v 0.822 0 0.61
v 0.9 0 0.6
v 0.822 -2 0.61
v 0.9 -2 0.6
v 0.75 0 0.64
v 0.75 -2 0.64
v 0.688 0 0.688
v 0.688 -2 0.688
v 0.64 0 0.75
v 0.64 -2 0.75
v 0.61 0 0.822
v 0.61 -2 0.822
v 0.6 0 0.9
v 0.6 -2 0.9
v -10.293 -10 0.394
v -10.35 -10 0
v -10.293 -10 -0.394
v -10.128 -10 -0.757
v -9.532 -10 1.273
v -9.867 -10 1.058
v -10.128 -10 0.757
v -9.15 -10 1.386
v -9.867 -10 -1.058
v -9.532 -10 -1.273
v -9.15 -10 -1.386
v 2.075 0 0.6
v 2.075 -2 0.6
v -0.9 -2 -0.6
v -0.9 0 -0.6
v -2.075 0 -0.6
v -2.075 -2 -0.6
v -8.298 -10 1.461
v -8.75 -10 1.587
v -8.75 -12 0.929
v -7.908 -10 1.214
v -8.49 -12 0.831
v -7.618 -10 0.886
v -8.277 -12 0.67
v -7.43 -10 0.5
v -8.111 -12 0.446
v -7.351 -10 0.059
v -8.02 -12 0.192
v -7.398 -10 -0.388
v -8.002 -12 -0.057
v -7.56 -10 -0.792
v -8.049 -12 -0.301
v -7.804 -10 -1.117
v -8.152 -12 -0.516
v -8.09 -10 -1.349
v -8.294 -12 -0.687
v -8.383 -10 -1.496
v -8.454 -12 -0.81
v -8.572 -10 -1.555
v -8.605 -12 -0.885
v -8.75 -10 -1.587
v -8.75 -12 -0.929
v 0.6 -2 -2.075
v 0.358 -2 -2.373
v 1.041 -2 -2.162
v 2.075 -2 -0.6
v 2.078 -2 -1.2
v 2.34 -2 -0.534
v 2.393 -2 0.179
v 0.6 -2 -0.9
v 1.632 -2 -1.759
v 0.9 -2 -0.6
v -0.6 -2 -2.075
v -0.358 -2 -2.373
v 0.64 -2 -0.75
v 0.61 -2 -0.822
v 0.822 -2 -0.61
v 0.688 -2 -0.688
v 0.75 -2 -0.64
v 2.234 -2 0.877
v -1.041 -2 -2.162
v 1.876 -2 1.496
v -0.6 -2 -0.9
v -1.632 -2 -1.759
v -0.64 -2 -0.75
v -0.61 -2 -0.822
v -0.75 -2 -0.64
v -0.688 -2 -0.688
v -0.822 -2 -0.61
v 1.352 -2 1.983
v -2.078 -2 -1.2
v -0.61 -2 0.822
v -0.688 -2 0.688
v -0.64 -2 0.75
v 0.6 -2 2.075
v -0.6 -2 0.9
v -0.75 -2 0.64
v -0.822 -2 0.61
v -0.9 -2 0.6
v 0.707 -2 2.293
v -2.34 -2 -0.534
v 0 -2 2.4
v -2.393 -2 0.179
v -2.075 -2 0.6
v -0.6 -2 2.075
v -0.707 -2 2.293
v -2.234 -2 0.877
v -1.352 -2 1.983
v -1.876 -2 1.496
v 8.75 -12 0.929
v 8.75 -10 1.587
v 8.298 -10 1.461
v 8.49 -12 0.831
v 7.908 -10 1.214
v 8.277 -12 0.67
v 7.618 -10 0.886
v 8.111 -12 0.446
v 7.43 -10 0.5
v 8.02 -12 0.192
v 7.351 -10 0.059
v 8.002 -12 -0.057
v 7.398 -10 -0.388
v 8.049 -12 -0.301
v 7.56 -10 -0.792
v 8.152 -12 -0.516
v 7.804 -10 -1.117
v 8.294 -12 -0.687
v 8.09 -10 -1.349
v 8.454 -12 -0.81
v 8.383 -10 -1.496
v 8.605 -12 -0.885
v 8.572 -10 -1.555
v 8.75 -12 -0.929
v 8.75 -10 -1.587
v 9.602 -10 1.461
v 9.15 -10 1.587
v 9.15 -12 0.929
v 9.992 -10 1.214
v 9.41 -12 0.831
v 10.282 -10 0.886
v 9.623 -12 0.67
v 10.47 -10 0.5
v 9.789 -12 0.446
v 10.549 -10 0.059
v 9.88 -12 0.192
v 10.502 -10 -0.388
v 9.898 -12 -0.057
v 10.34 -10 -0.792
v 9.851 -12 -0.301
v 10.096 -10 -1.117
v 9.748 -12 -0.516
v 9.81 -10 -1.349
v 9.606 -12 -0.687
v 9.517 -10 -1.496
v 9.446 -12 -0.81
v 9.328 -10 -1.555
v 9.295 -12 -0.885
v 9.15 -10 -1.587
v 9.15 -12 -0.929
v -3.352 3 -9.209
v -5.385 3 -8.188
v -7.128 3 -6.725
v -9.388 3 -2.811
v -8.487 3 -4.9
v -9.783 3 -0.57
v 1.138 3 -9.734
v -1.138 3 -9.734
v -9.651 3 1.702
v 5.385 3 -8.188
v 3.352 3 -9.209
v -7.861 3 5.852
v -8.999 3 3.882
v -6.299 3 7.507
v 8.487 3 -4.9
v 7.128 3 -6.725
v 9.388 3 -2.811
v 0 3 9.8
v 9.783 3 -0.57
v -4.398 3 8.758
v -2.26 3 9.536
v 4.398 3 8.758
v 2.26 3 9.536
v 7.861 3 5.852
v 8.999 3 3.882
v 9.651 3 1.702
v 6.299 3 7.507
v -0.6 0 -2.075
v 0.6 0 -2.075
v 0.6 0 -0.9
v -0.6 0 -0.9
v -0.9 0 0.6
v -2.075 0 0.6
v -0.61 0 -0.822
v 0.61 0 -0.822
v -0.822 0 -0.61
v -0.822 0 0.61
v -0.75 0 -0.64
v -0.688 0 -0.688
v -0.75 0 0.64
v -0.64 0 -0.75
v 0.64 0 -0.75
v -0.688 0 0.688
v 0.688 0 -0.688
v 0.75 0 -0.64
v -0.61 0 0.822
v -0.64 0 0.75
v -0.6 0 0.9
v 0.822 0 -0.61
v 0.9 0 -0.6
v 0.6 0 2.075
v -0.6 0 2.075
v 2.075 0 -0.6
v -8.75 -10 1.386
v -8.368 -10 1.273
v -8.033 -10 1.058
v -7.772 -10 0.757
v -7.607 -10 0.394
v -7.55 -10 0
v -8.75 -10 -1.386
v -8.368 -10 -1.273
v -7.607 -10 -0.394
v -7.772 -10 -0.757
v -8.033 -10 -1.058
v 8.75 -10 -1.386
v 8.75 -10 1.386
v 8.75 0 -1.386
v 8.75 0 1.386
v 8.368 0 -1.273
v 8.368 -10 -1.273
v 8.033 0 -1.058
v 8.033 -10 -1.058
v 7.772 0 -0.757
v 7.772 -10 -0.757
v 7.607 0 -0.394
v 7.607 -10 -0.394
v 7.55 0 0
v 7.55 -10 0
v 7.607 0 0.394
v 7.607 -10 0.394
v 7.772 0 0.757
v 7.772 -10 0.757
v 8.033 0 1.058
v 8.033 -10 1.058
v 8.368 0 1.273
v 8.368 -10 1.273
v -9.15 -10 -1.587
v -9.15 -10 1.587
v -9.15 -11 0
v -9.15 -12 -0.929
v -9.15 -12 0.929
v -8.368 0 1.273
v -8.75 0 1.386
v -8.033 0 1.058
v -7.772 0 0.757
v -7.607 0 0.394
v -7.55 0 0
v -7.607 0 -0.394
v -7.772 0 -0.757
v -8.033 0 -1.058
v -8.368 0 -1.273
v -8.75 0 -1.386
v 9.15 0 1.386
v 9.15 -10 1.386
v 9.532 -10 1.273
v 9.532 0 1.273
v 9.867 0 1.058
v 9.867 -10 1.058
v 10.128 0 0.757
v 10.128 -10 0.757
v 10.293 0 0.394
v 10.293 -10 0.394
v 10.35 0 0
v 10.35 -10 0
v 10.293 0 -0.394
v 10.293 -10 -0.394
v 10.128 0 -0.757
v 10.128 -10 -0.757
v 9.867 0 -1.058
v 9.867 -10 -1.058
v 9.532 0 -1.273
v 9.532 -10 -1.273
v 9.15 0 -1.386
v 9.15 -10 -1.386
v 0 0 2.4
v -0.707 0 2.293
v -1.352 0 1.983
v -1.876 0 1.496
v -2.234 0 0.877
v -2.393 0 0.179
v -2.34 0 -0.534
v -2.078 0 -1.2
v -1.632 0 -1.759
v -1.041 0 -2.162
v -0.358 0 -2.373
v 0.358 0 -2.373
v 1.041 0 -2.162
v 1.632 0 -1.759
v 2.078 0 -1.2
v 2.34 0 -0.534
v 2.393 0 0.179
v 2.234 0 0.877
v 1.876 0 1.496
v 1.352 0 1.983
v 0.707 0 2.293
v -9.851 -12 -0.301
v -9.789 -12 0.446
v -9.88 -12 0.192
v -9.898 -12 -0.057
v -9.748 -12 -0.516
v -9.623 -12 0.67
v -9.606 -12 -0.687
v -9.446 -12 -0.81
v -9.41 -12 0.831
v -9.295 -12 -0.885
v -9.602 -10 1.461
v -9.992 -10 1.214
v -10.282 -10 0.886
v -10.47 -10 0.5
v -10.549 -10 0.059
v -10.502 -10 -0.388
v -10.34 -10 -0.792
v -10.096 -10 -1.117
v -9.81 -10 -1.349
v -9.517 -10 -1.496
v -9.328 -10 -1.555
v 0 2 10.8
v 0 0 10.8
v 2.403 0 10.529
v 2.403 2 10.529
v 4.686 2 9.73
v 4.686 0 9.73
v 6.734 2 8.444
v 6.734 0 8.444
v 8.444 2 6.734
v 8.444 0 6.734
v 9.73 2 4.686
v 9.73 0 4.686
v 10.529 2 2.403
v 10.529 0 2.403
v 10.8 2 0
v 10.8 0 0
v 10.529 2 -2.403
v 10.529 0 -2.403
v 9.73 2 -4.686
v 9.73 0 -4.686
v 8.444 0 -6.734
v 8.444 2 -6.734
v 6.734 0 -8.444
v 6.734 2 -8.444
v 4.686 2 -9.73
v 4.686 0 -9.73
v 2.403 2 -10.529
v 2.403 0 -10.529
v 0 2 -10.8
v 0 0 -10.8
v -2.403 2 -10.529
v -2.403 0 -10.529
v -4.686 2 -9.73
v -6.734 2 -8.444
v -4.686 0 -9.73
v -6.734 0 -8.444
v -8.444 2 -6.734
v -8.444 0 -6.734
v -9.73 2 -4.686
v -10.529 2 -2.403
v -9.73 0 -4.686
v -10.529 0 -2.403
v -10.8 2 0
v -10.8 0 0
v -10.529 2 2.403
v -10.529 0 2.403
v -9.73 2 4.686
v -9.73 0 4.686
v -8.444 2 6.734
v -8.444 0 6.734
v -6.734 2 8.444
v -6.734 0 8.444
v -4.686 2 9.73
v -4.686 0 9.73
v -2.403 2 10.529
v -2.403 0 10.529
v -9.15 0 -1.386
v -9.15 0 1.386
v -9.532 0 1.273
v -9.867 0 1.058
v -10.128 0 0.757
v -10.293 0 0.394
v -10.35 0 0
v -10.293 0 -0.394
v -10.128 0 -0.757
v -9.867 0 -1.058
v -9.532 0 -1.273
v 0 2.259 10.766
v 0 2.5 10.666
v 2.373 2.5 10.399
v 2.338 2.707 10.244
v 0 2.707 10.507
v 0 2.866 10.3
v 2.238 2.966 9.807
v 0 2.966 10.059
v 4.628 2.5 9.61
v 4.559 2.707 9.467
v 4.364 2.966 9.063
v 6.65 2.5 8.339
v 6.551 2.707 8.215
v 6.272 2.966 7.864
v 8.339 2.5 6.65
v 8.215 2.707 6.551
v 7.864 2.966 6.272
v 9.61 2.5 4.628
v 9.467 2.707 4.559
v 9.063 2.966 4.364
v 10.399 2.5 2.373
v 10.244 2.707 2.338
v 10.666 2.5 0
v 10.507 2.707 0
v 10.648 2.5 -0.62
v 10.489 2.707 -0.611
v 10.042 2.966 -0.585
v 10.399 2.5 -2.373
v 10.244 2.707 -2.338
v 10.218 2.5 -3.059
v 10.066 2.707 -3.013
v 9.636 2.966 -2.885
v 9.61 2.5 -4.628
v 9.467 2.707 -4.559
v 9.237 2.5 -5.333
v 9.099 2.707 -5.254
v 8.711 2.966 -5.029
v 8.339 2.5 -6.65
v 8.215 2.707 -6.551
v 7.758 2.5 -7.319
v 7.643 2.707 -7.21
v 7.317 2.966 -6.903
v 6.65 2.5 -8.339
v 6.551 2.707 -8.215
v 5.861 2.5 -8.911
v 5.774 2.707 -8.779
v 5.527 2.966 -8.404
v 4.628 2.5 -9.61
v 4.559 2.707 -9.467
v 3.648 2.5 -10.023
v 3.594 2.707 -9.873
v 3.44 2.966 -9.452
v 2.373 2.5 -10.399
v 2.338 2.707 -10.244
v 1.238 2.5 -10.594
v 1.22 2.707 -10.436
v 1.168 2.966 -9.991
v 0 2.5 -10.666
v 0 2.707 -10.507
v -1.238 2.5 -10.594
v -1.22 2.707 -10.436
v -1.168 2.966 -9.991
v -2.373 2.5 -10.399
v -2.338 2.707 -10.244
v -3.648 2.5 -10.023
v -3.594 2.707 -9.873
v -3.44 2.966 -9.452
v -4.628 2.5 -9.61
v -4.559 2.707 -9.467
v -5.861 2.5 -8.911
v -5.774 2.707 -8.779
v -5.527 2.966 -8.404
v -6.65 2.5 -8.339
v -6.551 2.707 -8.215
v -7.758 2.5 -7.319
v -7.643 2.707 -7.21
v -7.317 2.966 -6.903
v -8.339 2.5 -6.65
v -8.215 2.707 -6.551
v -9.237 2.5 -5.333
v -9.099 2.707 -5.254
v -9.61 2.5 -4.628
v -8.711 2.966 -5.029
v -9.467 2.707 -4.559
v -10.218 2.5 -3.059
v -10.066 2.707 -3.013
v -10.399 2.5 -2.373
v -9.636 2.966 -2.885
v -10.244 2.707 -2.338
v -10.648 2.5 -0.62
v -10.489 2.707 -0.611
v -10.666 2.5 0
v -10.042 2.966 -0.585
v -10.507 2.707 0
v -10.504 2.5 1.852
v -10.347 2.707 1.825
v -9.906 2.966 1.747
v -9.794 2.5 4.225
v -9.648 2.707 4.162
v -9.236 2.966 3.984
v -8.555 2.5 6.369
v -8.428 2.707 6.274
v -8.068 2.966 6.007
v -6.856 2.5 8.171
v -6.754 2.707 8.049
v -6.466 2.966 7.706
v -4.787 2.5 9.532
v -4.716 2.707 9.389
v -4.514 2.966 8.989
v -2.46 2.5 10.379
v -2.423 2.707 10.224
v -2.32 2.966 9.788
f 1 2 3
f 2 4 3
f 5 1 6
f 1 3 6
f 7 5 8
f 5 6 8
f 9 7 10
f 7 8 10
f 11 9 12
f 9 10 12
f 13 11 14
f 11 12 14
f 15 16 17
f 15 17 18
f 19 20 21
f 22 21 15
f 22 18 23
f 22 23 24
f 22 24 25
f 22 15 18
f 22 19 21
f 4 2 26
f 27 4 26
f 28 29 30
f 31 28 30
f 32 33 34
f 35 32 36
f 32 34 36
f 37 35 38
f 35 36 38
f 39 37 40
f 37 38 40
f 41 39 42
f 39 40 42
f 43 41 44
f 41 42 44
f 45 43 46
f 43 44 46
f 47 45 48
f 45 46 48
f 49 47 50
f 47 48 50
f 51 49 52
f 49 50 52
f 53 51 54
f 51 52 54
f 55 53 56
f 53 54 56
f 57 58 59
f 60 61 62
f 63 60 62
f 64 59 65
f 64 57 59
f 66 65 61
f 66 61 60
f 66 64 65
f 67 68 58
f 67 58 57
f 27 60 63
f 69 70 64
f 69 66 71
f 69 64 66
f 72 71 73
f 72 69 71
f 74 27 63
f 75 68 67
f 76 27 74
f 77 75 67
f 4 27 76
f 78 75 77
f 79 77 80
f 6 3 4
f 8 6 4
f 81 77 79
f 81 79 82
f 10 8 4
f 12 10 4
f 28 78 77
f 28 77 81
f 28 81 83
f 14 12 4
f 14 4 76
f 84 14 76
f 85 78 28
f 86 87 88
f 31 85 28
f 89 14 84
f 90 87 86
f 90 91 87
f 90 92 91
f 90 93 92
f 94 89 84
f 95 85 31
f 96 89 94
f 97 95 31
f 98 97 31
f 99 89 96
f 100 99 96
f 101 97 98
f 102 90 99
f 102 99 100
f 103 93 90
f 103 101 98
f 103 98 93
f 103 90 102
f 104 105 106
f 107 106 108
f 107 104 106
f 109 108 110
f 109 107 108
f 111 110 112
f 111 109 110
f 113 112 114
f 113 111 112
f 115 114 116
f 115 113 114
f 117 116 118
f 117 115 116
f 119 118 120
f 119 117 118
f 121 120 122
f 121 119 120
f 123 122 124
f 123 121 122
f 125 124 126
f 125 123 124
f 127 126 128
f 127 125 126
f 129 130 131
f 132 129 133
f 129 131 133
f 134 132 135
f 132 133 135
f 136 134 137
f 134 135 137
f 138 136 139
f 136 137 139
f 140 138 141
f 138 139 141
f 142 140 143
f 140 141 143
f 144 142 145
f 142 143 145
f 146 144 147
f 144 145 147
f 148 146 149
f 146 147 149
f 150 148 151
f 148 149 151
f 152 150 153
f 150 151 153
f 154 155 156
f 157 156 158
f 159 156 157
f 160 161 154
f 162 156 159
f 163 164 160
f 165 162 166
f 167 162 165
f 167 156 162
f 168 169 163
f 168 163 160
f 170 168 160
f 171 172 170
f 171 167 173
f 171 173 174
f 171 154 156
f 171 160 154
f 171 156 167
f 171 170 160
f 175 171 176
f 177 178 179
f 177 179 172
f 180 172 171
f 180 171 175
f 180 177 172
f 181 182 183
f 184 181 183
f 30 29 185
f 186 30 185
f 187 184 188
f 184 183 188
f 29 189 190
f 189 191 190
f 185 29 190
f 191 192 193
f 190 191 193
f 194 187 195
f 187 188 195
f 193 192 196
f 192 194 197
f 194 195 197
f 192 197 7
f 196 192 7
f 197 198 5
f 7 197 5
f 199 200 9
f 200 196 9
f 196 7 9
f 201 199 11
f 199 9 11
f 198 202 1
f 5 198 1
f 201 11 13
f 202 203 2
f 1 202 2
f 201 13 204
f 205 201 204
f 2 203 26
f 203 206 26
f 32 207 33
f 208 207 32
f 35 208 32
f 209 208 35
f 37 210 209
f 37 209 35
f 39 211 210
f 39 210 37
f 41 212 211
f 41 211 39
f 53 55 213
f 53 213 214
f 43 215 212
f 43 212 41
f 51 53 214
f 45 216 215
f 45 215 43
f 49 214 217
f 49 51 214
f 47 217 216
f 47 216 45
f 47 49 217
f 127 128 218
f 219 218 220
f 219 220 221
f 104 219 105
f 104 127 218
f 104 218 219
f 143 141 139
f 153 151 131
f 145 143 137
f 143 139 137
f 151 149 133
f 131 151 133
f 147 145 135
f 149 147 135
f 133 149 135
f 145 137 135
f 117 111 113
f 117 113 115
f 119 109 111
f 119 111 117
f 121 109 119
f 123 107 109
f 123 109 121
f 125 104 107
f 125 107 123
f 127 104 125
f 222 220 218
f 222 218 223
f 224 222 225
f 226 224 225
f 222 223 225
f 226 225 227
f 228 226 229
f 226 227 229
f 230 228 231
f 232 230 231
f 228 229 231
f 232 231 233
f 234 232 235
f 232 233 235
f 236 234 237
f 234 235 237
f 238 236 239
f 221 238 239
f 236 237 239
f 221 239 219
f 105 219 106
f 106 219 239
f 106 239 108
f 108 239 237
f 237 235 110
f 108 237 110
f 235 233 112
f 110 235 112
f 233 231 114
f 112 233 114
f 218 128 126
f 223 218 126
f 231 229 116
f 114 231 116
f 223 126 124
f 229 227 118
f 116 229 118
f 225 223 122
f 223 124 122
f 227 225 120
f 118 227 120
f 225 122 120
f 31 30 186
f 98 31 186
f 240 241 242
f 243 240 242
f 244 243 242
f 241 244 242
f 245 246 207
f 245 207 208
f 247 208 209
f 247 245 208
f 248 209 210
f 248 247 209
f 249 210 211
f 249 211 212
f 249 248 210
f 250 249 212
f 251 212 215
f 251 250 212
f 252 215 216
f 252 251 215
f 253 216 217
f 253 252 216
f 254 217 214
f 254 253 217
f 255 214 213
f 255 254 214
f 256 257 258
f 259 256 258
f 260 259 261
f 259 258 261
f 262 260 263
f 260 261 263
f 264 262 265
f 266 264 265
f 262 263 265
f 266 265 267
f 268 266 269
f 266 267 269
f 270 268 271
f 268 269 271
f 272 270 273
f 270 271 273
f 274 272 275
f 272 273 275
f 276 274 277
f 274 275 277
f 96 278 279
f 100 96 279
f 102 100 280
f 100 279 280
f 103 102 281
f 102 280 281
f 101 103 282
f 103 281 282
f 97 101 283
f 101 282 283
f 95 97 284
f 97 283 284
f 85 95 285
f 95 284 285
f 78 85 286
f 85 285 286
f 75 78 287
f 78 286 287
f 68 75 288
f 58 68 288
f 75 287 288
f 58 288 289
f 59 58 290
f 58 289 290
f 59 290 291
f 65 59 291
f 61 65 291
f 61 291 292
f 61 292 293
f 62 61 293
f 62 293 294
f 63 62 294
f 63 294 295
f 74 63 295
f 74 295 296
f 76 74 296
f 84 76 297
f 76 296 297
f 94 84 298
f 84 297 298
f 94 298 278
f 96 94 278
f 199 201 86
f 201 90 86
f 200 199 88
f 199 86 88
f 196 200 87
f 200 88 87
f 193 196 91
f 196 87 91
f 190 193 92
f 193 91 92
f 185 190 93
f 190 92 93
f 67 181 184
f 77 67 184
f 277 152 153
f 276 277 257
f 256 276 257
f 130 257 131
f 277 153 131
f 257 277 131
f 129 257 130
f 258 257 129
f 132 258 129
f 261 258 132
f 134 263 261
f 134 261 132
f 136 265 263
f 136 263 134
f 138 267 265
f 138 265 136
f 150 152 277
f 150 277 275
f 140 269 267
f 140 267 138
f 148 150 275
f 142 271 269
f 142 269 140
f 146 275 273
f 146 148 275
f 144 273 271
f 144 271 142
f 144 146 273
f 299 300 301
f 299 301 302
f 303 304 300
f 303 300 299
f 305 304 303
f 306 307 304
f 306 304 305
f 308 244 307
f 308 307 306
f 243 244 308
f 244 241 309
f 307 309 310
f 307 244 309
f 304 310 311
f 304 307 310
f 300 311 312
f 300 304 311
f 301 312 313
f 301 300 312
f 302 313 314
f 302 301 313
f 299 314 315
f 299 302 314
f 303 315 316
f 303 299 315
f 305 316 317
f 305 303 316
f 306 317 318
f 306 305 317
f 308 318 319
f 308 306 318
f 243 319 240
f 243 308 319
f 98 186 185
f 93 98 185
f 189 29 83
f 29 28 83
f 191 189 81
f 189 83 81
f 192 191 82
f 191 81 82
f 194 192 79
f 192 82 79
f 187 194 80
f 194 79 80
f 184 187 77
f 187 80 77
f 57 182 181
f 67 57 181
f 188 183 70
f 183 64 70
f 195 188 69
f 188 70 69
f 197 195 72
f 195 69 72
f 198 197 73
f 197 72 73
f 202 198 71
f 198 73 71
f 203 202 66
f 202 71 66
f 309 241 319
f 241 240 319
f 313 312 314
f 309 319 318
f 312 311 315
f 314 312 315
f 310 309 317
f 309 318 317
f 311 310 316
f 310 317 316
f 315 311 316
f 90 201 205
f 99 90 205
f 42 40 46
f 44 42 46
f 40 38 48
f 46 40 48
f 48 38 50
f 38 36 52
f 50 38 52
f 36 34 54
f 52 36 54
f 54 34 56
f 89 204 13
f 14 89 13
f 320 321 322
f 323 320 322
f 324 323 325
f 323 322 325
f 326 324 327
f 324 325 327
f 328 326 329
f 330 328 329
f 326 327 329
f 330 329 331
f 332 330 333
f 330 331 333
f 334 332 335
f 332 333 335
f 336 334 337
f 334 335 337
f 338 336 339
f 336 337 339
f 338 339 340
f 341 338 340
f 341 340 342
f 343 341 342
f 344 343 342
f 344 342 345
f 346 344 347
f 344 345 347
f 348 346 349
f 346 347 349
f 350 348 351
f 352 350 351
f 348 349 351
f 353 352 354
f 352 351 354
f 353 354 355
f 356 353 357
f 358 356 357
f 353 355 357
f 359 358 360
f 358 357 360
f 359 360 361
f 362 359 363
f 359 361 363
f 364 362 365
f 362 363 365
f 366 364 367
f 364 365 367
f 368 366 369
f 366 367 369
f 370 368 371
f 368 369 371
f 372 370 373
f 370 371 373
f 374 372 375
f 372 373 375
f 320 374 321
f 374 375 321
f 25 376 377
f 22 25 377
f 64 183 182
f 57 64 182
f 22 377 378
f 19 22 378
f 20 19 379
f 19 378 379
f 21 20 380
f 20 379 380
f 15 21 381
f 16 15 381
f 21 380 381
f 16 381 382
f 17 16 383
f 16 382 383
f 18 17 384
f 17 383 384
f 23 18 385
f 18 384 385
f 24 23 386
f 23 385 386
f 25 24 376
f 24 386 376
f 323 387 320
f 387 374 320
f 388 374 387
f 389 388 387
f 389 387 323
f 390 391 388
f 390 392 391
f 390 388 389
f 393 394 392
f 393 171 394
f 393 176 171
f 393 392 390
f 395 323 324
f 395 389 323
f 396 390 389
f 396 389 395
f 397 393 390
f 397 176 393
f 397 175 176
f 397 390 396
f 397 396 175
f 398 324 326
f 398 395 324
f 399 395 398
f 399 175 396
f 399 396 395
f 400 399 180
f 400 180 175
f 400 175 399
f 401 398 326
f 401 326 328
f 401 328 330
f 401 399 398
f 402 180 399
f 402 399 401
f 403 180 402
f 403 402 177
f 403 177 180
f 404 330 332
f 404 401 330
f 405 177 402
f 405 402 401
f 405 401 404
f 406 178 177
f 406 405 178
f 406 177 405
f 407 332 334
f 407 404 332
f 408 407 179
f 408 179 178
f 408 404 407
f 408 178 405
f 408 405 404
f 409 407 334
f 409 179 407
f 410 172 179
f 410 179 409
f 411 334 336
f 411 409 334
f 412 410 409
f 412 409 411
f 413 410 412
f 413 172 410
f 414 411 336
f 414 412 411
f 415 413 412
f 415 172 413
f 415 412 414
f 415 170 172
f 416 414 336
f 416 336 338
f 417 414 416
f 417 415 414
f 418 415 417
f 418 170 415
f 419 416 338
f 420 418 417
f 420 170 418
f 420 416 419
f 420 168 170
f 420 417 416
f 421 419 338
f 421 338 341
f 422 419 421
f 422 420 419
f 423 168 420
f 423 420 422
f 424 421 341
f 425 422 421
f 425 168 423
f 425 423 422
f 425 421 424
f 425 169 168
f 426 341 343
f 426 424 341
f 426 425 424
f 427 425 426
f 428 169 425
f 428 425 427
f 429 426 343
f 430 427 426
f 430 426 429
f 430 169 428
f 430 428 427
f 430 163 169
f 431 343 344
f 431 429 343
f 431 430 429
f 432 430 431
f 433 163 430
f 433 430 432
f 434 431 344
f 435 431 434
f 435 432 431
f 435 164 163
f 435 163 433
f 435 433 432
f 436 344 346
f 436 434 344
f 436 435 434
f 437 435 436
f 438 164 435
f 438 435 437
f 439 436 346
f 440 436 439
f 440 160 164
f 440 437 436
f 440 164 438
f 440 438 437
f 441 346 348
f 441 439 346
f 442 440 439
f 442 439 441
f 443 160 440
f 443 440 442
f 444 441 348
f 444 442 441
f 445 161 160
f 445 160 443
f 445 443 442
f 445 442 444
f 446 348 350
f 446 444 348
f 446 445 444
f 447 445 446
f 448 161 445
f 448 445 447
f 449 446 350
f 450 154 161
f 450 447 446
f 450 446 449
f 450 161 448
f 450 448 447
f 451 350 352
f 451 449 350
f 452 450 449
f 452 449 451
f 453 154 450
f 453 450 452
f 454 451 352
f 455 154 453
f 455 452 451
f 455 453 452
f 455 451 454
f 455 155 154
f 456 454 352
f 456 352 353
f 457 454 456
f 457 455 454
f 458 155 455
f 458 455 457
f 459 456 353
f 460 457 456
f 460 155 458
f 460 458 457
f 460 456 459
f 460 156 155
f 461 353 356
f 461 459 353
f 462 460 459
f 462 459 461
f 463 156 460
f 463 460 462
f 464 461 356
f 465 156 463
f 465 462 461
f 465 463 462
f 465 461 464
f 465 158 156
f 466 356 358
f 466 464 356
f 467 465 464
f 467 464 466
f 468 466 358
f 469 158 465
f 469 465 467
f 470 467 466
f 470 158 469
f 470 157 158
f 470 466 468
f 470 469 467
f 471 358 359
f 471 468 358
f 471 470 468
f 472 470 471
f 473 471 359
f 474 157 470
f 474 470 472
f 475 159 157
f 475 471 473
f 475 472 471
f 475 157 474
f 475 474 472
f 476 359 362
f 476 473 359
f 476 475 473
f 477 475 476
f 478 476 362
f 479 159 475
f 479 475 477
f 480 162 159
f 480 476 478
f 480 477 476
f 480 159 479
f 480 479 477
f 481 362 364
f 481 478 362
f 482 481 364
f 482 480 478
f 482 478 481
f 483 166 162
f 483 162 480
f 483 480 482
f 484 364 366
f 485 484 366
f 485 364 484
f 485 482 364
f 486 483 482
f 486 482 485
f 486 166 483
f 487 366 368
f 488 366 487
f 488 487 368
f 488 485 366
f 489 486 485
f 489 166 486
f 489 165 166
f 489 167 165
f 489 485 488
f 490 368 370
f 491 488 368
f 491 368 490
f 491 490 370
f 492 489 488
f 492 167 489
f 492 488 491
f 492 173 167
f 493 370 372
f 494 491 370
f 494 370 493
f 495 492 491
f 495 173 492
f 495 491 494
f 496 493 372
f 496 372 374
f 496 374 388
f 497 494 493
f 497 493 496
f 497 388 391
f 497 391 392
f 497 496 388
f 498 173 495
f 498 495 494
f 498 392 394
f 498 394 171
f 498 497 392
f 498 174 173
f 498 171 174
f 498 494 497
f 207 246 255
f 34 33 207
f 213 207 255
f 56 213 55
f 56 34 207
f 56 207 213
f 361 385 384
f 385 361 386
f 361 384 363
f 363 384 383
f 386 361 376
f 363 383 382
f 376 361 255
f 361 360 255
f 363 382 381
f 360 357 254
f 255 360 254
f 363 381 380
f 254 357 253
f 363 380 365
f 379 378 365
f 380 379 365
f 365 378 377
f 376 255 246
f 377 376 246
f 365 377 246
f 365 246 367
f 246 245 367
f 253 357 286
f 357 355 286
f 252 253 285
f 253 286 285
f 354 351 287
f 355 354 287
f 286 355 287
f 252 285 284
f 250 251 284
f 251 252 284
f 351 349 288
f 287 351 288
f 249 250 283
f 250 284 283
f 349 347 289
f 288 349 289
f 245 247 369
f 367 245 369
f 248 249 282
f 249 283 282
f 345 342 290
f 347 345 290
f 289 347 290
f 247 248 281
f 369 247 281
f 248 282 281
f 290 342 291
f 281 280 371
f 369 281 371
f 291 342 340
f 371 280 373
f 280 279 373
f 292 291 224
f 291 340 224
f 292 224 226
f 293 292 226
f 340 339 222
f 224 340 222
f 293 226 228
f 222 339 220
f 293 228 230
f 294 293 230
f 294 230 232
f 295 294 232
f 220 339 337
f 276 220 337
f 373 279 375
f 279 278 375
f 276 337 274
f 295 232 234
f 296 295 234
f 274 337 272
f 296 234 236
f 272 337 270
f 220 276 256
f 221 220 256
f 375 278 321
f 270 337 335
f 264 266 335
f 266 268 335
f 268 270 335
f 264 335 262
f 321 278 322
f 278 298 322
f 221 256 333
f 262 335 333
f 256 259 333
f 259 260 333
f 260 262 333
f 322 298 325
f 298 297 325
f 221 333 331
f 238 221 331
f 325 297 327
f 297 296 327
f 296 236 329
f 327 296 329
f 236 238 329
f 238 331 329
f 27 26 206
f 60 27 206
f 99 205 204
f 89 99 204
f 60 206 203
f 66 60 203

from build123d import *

# Parameters (mm, degrees)
SKETCH1_R           = 10.8
BOSS_EXTRUDE1_DEPTH = 3
BOSS_EXTRUDE3_DEPTH = 10
MIRROR3_START       = -10
MIRROR3_DEPTH       = 10
FILLET1_R           = 1
SKETCH6_R           = 2.4
BOSS_EXTRUDE4_DEPTH = 2
FILLET2_R           = 0.3


with BuildPart() as part:
    # Sketch1 → Boss-Extrude1 (new body)
    with BuildSketch(Plane(origin=(0, 0, 0), x_dir=(1, 0, 0), z_dir=(0, 1, 0))):
        with Locations(Location((0, 0, 0), (0, 0, 270))):
            Circle(SKETCH1_R)
    extrude(amount=BOSS_EXTRUDE1_DEPTH)

    # Sketch2 → Boss-Extrude3 (add)
    with BuildSketch(Plane.XZ):
        with BuildLine():
            Line((-9.15, 0), (-9.15, 1.385640646))
            ThreePointArc((-9.15, 1.385640646), (-10.35, 0), (-9.15, -1.385640646))
            Line((-9.15, -1.385640646), (-9.15, 0))
        make_face()
    boss_extrude3 = extrude(amount=BOSS_EXTRUDE3_DEPTH)


with BuildPart() as body_2:
    # Loft3: read off the stored shape, not the designer's step
    # Loft3: loft between two sections, ruled curve by curve
    loft3_from = [
        Edge.make_bspline([(-9.15, -10, 1.587450787), (-11.67, -10, 1.269960629), (-11.67, -10, -1.269960629), (-9.15, -10, -1.587450787)], [0, 0, 0, 0, 1, 1, 1, 1], 3, [1, 0.416666667, 0.416666667, 1]),
        Edge.make_line((-9.15, -10, 1.587450787), (-9.15, -10, -1.587450787)),
    ]
    loft3_to = [
        Edge.make_bspline([(-9.15, -12, 0.928708781), (-10.427777778, -12, 0.653535809), (-10.427777778, -12, -0.653535809), (-9.15, -12, -0.928708781)], [0, 0, 0, 0, 1, 1, 1, 1], 3, [1, 0.473684211, 0.473684211, 1]),
        Edge.make_line((-9.15, -12, 0.928708781), (-9.15, -12, -0.928708781)),
    ]
    loft3 = Solid(Shell([*[Face.make_surface_from_curves(loft3_from[k], loft3_to[k]) for k in range(2)], Face(Wire(loft3_from)), Face(Wire(loft3_to))]))
    add(loft3)


with BuildPart() as part_1:
    add(part.part)

    # Mirror2: Boss-Extrude3, Loft3 across plane
    add(boss_extrude3.mirror(Plane(origin=(-8.95, 0, 0), x_dir=(0, 0, 1), z_dir=(1, 0, 0))))
    add(loft3.mirror(Plane(origin=(-8.95, 0, 0), x_dir=(0, 0, 1), z_dir=(1, 0, 0))))

    # Mirror3: read off the stored shape, not the designer's step
    # Mirror3 outline → Mirror3 (add)
    with BuildSketch(Plane(origin=(0, 0, 0), x_dir=(1, 0, 0), z_dir=(0, 1, 0)).offset(MIRROR3_START)):
        with BuildLine():
            Line((9.15, 1.385640646), (9.15, -1.385640646))
            ThreePointArc((9.15, -1.385640646), (10.35, 0), (9.15, 1.385640646))
        make_face()
        with BuildLine():
            Line((8.75, -1.385640646), (8.75, 1.385640646))
            ThreePointArc((8.75, 1.385640646), (7.55, 0), (8.75, -1.385640646))
        make_face()
    extrude(amount=MIRROR3_DEPTH)

    # Mirror3 2: loft between two sections, ruled curve by curve
    mirror3_2_from = [
        Edge.make_bspline([(8.75, -10, 1.587450787), (6.23, -10, 1.269960629), (6.23, -10, -1.269960629), (8.75, -10, -1.587450787)], [0, 0, 0, 0, 1, 1, 1, 1], 3, [1, 0.416666667, 0.416666667, 1]),
        Edge.make_line((8.75, -10, -1.587450787), (8.75, -10, 1.587450787)),
    ]
    mirror3_2_to = [
        Edge.make_bspline([(8.75, -12, 0.928708781), (7.472222222, -12, 0.653535809), (7.472222222, -12, -0.653535809), (8.75, -12, -0.928708781)], [0, 0, 0, 0, 1, 1, 1, 1], 3, [1, 0.473684211, 0.473684211, 1]),
        Edge.make_line((8.75, -12, -0.928708781), (8.75, -12, 0.928708781)),
    ]
    mirror3_2 = Solid(Shell([*[Face.make_surface_from_curves(mirror3_2_from[k], mirror3_2_to[k]) for k in range(2)], Face(Wire(mirror3_2_from)), Face(Wire(mirror3_2_to))]))
    add(mirror3_2)

    # Mirror3 3: loft between two sections, ruled curve by curve
    mirror3_3_from = [
        Edge.make_bspline([(9.15, -10, 1.587450787), (11.67, -10, 1.269960629), (11.67, -10, -1.269960629), (9.15, -10, -1.587450787)], [0, 0, 0, 0, 1, 1, 1, 1], 3, [1, 0.416666667, 0.416666667, 1]),
        Edge.make_line((9.15, -10, -1.587450787), (9.15, -10, 1.587450787)),
    ]
    mirror3_3_to = [
        Edge.make_bspline([(9.15, -12, 0.928708781), (10.427777778, -12, 0.653535809), (10.427777778, -12, -0.653535809), (9.15, -12, -0.928708781)], [0, 0, 0, 0, 1, 1, 1, 1], 3, [1, 0.473684211, 0.473684211, 1]),
        Edge.make_line((9.15, -12, -0.928708781), (9.15, -12, 0.928708781)),
    ]
    mirror3_3 = Solid(Shell([*[Face.make_surface_from_curves(mirror3_3_from[k], mirror3_3_to[k]) for k in range(2)], Face(Wire(mirror3_3_from)), Face(Wire(mirror3_3_to))]))
    add(mirror3_3)

    # Fillet1
    fillet1_edges = [part_1.edges().sort_by_distance(p)[0] for p in [
        (0, 3, -10.8),
    ]]
    fillet(fillet1_edges, radius=FILLET1_R)

    # Sketch6 → Boss-Extrude4 (add)
    with BuildSketch(Plane.XZ):
        with Locations(Location((0, 0, 0), (0, 0, 90))):
            Circle(SKETCH6_R)
        Polygon((2.075, 0.6), (2.075, -0.6), (0.6, -0.6), (0.6, -2.075), (-0.6, -2.075), (-0.6, -0.6), (-2.075, -0.6), (-2.075, 0.6), (-0.6, 0.6), (-0.6, 2.075), (0.6, 2.075), (0.6, 0.6), align=None, mode=Mode.SUBTRACT)
    extrude(amount=BOSS_EXTRUDE4_DEPTH)

    # Fillet2
    fillet2_edges = [part_1.edges().sort_by_distance(p)[0] for p in [
        (0.6, -1, -0.6),
        (-0.6, -1, -0.6),
        (-0.6, -1, 0.6),
        (0.6, -1, 0.6),
    ]]
    fillet(fillet2_edges, radius=FILLET2_R)


solid = Compound([body_2.part, part_1.part])
